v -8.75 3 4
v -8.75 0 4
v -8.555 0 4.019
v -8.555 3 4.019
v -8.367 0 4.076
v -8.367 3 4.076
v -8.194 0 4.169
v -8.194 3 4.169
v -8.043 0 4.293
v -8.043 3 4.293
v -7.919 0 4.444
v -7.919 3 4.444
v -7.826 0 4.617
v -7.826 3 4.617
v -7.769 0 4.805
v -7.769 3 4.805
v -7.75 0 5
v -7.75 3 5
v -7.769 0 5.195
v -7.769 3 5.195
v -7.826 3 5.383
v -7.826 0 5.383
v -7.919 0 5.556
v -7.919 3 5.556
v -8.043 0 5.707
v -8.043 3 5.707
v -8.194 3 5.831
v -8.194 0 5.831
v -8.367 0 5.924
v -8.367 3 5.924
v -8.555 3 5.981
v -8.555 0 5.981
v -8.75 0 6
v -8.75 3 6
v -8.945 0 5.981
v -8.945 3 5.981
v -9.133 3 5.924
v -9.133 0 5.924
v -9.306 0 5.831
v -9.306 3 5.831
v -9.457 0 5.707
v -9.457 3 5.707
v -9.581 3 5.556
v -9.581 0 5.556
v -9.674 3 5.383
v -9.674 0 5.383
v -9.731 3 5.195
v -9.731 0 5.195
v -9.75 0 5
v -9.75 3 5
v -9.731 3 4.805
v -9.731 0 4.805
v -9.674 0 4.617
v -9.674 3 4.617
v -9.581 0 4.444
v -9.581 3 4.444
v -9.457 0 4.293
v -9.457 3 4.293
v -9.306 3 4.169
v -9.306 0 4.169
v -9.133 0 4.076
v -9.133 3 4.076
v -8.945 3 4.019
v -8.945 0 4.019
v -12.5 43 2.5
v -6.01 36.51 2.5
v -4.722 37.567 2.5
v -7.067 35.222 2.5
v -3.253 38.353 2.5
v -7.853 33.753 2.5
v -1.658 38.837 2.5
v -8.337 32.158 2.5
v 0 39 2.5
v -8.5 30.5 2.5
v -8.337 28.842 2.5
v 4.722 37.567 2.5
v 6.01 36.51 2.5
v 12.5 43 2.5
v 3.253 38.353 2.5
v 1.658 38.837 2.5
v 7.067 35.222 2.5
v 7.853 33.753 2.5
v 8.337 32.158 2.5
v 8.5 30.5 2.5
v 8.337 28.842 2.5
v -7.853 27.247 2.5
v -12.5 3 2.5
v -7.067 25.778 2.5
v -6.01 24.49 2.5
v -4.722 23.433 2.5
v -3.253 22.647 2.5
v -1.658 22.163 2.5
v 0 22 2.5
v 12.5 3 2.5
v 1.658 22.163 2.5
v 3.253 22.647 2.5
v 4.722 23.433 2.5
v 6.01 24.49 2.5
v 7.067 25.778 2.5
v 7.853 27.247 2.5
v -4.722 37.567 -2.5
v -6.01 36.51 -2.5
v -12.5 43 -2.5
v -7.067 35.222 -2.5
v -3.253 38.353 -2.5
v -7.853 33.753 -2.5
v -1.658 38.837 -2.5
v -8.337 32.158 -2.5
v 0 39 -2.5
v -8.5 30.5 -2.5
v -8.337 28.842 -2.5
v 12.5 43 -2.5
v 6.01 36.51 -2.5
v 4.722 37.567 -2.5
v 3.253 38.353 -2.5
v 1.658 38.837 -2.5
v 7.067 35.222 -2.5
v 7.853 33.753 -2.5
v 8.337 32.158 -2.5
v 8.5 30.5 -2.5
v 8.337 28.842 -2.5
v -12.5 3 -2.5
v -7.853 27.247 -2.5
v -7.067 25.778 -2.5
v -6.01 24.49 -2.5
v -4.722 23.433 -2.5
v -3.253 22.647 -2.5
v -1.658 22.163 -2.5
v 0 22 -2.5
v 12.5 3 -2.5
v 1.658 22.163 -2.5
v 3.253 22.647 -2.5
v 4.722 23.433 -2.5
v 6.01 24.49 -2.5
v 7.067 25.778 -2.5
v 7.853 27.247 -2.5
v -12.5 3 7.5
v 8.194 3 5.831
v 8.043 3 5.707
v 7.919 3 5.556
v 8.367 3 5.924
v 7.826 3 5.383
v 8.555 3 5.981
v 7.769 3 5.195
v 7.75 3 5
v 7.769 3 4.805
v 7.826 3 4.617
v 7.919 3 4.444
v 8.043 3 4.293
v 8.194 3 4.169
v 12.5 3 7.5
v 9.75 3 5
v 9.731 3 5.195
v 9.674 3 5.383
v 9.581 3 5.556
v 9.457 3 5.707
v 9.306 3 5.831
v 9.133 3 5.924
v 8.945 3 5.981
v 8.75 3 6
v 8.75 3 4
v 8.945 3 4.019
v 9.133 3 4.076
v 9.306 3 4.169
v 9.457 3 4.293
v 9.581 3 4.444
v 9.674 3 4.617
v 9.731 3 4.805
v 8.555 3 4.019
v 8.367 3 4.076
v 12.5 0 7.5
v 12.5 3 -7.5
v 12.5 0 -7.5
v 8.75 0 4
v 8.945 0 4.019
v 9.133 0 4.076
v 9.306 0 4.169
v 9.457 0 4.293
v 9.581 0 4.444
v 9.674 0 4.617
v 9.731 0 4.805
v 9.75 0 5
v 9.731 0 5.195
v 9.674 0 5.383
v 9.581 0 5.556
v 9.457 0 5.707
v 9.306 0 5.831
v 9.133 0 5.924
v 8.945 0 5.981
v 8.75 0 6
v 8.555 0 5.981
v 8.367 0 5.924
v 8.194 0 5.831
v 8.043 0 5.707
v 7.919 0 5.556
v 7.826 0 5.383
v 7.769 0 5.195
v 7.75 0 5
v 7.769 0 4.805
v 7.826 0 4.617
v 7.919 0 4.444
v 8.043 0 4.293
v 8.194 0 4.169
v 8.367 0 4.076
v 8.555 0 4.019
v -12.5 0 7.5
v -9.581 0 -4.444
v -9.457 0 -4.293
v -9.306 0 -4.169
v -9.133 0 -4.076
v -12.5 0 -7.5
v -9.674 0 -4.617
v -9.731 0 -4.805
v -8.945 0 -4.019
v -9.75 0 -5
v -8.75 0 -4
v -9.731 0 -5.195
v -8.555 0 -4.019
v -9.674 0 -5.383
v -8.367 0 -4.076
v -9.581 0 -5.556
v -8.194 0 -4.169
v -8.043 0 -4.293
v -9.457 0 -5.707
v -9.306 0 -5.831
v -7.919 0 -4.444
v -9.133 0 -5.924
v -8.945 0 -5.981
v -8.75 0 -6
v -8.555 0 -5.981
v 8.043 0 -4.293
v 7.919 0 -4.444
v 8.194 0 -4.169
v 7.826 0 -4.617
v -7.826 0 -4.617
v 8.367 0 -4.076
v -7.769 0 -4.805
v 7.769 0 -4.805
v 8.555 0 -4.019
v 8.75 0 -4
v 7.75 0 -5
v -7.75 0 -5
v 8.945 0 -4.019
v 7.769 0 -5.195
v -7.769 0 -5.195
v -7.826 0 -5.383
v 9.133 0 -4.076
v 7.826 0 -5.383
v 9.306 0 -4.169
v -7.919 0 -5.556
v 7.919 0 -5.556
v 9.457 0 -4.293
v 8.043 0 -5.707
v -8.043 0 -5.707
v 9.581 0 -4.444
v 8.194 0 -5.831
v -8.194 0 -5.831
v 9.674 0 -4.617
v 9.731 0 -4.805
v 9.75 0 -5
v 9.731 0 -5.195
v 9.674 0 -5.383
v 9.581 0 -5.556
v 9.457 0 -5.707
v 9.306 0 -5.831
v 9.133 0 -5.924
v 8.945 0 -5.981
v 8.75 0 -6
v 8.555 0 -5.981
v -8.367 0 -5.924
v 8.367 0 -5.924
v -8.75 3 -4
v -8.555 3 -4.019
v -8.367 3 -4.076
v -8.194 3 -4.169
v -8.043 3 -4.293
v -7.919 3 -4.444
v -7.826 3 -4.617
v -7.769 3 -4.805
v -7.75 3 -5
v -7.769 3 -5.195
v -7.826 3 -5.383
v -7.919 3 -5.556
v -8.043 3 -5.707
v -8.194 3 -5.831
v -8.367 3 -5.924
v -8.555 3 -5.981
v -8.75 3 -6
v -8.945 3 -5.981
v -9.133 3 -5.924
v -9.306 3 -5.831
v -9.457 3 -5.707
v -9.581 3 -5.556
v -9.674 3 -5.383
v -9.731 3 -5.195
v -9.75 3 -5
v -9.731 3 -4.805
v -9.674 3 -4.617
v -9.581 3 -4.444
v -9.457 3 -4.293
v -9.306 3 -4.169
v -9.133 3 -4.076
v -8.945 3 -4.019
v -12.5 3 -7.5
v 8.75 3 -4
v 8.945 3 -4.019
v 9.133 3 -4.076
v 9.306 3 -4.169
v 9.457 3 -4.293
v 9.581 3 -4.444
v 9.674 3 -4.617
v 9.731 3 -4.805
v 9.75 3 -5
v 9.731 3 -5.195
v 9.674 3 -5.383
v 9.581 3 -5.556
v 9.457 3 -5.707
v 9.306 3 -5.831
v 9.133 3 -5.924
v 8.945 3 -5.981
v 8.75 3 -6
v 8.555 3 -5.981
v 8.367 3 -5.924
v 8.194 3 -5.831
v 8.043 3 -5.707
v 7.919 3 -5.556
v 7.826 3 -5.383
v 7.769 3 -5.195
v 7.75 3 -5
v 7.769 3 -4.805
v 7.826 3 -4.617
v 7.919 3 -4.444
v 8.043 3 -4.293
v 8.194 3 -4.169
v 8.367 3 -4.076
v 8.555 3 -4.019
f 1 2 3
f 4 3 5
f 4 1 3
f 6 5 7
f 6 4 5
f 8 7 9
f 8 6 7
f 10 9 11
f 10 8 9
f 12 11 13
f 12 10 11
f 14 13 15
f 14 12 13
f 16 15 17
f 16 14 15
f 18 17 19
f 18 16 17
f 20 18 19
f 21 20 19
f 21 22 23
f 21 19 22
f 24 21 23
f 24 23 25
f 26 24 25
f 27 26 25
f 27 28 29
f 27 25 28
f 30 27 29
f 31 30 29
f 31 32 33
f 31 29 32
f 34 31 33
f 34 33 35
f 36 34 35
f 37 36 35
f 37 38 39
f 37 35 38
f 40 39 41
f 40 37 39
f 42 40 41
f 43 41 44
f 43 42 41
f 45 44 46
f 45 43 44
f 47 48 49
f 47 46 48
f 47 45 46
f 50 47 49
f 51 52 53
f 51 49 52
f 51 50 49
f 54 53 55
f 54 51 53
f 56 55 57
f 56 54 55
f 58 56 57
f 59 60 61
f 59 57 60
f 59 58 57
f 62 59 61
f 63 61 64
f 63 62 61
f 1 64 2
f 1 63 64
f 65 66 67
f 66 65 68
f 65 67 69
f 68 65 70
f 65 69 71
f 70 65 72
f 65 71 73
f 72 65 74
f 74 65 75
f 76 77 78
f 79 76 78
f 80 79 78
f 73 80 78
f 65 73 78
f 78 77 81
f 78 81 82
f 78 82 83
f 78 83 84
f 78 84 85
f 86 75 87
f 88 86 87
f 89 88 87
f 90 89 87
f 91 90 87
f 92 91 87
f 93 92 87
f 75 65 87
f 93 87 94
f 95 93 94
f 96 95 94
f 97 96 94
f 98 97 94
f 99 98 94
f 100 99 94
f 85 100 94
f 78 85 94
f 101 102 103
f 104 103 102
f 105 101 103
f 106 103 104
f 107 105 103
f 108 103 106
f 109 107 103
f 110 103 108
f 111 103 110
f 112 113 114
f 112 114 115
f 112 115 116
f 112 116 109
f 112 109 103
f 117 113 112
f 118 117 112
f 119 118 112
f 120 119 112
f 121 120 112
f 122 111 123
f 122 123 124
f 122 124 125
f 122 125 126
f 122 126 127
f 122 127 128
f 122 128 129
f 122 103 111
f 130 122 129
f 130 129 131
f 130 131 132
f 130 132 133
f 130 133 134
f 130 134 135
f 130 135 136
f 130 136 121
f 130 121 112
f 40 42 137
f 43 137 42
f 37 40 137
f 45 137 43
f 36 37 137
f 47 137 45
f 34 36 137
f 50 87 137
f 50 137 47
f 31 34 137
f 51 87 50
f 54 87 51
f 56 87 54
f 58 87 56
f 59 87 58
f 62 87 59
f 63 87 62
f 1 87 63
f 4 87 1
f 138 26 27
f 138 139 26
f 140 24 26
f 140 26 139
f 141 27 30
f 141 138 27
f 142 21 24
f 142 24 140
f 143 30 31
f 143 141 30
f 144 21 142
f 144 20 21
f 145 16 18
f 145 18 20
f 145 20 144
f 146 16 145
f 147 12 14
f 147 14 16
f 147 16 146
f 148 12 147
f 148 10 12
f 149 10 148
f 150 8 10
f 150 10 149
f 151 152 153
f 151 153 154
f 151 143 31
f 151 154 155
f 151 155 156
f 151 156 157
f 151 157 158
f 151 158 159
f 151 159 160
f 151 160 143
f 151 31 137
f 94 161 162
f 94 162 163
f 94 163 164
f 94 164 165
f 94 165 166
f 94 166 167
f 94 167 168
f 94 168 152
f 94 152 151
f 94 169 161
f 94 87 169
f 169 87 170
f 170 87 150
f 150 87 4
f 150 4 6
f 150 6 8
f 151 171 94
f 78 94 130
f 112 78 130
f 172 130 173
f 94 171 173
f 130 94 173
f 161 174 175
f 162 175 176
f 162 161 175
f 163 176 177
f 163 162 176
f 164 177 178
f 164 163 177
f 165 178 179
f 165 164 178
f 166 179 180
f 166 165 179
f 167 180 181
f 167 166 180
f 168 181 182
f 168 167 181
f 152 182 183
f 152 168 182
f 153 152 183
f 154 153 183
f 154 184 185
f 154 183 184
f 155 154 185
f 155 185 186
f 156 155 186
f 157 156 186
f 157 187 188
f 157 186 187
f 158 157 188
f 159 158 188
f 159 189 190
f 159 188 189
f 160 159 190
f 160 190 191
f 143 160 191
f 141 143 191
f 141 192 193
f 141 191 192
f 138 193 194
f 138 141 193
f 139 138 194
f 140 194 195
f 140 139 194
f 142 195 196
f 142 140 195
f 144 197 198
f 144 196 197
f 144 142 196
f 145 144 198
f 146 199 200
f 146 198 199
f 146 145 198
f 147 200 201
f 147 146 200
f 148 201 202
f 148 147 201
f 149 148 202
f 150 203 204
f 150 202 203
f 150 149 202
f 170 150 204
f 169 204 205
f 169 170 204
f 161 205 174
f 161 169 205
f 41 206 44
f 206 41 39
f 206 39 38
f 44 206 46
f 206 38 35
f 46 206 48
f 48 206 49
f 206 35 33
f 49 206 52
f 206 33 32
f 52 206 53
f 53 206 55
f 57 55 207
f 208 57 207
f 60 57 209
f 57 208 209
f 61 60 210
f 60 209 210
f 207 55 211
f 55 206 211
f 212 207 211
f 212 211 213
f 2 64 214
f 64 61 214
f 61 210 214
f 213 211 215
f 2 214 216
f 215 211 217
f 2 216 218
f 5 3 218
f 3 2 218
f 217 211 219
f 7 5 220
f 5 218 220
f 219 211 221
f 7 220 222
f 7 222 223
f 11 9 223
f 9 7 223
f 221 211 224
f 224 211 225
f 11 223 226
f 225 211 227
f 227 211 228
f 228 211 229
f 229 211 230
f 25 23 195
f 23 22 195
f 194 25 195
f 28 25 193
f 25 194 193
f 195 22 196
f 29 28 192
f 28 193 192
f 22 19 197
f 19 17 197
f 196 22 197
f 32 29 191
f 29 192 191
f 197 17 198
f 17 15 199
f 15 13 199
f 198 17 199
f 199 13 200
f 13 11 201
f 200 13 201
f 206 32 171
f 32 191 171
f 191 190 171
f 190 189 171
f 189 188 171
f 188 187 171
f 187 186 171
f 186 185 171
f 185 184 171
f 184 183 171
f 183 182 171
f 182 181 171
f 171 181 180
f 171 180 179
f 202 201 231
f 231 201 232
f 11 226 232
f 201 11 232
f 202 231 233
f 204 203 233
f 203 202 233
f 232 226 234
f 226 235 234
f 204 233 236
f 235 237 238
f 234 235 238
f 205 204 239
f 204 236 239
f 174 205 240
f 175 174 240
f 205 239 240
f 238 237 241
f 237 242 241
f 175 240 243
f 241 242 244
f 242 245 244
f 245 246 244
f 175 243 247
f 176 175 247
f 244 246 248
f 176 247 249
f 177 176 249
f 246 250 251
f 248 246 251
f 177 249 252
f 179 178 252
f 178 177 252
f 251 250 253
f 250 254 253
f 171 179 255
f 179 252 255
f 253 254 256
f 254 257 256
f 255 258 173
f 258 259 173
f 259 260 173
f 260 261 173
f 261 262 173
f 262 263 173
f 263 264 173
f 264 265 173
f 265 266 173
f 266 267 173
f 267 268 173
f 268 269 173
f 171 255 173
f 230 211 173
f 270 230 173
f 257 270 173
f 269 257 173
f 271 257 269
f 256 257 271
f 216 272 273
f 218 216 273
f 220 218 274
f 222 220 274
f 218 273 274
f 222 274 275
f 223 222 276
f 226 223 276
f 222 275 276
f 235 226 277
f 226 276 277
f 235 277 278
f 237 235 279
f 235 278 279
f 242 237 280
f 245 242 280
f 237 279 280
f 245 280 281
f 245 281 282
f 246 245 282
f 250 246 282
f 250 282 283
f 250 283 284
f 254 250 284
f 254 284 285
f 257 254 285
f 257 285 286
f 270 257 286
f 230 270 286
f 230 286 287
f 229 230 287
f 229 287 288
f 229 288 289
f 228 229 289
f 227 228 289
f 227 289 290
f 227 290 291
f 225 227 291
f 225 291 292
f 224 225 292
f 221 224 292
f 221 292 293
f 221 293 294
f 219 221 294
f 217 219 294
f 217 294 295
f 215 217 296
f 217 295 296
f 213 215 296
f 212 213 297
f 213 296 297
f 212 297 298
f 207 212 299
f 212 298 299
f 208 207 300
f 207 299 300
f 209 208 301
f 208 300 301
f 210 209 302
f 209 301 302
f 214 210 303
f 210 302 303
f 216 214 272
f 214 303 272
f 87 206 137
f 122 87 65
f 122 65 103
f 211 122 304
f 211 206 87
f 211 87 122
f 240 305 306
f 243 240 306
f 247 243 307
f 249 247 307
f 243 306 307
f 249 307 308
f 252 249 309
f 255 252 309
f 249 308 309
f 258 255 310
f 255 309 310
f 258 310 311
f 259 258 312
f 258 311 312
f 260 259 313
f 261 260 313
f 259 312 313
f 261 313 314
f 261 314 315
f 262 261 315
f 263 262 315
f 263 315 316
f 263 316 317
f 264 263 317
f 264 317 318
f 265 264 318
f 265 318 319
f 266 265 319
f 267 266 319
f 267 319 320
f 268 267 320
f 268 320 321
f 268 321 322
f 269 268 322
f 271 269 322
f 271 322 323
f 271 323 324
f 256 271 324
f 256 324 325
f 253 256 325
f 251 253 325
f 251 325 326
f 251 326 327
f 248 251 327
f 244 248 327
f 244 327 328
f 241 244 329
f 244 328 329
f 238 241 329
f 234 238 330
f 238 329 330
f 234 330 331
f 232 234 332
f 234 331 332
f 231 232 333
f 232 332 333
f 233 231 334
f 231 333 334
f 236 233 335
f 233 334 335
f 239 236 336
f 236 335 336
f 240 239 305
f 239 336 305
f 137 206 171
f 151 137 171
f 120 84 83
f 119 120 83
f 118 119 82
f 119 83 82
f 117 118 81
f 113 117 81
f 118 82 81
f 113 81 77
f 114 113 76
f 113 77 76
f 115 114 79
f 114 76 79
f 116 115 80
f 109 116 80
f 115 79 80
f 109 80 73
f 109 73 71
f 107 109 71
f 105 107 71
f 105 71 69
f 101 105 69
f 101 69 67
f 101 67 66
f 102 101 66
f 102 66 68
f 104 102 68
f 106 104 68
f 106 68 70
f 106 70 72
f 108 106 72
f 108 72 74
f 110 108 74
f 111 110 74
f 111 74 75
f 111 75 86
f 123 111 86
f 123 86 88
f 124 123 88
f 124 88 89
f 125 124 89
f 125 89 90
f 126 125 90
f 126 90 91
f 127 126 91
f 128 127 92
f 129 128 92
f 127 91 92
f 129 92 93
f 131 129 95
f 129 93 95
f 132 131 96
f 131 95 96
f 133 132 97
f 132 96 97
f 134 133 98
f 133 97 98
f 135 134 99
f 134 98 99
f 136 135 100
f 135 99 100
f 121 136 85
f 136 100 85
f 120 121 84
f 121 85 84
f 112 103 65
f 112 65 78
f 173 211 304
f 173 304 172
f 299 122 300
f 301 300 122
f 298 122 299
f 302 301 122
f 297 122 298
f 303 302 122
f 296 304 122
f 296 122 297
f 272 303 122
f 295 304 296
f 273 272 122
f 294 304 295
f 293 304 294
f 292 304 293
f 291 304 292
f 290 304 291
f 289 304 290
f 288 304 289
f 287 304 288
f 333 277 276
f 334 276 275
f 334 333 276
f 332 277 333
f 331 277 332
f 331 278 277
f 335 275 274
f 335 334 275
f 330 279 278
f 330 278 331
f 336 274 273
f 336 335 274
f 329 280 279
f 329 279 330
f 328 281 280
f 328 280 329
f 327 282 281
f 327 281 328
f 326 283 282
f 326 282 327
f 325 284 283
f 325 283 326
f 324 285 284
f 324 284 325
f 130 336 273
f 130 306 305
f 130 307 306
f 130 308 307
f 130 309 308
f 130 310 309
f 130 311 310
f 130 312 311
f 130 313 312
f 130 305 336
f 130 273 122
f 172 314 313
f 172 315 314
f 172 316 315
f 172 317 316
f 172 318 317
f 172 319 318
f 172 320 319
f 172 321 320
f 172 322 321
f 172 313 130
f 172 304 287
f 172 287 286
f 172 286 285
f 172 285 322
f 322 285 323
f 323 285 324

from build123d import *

# Parameters (mm, degrees)
SKETCH1_W           = 25
SKETCH1_H           = 15
BOSS_EXTRUDE1_DEPTH = 3
SKETCH2_W           = 25
SKETCH2_H           = 5
BOSS_EXTRUDE2_DEPTH = 40
SKETCH3_R           = 1
CUT_EXTRUDE1_DEPTH  = 43.573465915
SKETCH4_R           = 8.5
CUT_EXTRUDE2_DEPTH  = 46.883003389


with BuildPart() as part:
    # Sketch1 → Boss-Extrude1 (new body)
    with BuildSketch(Plane(origin=(0, 0, 0), x_dir=(1, 0, 0), z_dir=(0, 1, 0))):
        Rectangle(SKETCH1_W, SKETCH1_H)
    extrude(amount=BOSS_EXTRUDE1_DEPTH)

    # Sketch2 → Boss-Extrude2 (add)
    with BuildSketch(Plane(origin=(0, 3, 0), x_dir=(1, 0, 0), z_dir=(0, 1, 0))):
        Rectangle(SKETCH2_W, SKETCH2_H)
    extrude(amount=BOSS_EXTRUDE2_DEPTH)

    # Sketch3 → Cut-Extrude1 (cut, through all)
    with BuildSketch(Plane(origin=(0, 3, 0), x_dir=(1, 0, 0), z_dir=(0, 1, 0))):
        with Locations(Location((-8.75, 5, 0), (0, 0, 270))):
            Circle(SKETCH3_R)
        with Locations(Location((8.75, 5, 0), (0, 0, 270))):
            Circle(SKETCH3_R)
    cut_extrude1 = extrude(amount=-CUT_EXTRUDE1_DEPTH, mode=Mode.SUBTRACT)

    # Mirror1: Cut-Extrude1 across plane
    add(cut_extrude1.mirror(Plane.XY), mode=Mode.SUBTRACT)

    # Sketch4 → Cut-Extrude2 (cut, through all)
    with BuildSketch(Plane.XY.offset(2.5)):
        with Locations((0, 30.5)):
            Circle(SKETCH4_R)
    extrude(amount=-CUT_EXTRUDE2_DEPTH, mode=Mode.SUBTRACT)


solid = part.part
